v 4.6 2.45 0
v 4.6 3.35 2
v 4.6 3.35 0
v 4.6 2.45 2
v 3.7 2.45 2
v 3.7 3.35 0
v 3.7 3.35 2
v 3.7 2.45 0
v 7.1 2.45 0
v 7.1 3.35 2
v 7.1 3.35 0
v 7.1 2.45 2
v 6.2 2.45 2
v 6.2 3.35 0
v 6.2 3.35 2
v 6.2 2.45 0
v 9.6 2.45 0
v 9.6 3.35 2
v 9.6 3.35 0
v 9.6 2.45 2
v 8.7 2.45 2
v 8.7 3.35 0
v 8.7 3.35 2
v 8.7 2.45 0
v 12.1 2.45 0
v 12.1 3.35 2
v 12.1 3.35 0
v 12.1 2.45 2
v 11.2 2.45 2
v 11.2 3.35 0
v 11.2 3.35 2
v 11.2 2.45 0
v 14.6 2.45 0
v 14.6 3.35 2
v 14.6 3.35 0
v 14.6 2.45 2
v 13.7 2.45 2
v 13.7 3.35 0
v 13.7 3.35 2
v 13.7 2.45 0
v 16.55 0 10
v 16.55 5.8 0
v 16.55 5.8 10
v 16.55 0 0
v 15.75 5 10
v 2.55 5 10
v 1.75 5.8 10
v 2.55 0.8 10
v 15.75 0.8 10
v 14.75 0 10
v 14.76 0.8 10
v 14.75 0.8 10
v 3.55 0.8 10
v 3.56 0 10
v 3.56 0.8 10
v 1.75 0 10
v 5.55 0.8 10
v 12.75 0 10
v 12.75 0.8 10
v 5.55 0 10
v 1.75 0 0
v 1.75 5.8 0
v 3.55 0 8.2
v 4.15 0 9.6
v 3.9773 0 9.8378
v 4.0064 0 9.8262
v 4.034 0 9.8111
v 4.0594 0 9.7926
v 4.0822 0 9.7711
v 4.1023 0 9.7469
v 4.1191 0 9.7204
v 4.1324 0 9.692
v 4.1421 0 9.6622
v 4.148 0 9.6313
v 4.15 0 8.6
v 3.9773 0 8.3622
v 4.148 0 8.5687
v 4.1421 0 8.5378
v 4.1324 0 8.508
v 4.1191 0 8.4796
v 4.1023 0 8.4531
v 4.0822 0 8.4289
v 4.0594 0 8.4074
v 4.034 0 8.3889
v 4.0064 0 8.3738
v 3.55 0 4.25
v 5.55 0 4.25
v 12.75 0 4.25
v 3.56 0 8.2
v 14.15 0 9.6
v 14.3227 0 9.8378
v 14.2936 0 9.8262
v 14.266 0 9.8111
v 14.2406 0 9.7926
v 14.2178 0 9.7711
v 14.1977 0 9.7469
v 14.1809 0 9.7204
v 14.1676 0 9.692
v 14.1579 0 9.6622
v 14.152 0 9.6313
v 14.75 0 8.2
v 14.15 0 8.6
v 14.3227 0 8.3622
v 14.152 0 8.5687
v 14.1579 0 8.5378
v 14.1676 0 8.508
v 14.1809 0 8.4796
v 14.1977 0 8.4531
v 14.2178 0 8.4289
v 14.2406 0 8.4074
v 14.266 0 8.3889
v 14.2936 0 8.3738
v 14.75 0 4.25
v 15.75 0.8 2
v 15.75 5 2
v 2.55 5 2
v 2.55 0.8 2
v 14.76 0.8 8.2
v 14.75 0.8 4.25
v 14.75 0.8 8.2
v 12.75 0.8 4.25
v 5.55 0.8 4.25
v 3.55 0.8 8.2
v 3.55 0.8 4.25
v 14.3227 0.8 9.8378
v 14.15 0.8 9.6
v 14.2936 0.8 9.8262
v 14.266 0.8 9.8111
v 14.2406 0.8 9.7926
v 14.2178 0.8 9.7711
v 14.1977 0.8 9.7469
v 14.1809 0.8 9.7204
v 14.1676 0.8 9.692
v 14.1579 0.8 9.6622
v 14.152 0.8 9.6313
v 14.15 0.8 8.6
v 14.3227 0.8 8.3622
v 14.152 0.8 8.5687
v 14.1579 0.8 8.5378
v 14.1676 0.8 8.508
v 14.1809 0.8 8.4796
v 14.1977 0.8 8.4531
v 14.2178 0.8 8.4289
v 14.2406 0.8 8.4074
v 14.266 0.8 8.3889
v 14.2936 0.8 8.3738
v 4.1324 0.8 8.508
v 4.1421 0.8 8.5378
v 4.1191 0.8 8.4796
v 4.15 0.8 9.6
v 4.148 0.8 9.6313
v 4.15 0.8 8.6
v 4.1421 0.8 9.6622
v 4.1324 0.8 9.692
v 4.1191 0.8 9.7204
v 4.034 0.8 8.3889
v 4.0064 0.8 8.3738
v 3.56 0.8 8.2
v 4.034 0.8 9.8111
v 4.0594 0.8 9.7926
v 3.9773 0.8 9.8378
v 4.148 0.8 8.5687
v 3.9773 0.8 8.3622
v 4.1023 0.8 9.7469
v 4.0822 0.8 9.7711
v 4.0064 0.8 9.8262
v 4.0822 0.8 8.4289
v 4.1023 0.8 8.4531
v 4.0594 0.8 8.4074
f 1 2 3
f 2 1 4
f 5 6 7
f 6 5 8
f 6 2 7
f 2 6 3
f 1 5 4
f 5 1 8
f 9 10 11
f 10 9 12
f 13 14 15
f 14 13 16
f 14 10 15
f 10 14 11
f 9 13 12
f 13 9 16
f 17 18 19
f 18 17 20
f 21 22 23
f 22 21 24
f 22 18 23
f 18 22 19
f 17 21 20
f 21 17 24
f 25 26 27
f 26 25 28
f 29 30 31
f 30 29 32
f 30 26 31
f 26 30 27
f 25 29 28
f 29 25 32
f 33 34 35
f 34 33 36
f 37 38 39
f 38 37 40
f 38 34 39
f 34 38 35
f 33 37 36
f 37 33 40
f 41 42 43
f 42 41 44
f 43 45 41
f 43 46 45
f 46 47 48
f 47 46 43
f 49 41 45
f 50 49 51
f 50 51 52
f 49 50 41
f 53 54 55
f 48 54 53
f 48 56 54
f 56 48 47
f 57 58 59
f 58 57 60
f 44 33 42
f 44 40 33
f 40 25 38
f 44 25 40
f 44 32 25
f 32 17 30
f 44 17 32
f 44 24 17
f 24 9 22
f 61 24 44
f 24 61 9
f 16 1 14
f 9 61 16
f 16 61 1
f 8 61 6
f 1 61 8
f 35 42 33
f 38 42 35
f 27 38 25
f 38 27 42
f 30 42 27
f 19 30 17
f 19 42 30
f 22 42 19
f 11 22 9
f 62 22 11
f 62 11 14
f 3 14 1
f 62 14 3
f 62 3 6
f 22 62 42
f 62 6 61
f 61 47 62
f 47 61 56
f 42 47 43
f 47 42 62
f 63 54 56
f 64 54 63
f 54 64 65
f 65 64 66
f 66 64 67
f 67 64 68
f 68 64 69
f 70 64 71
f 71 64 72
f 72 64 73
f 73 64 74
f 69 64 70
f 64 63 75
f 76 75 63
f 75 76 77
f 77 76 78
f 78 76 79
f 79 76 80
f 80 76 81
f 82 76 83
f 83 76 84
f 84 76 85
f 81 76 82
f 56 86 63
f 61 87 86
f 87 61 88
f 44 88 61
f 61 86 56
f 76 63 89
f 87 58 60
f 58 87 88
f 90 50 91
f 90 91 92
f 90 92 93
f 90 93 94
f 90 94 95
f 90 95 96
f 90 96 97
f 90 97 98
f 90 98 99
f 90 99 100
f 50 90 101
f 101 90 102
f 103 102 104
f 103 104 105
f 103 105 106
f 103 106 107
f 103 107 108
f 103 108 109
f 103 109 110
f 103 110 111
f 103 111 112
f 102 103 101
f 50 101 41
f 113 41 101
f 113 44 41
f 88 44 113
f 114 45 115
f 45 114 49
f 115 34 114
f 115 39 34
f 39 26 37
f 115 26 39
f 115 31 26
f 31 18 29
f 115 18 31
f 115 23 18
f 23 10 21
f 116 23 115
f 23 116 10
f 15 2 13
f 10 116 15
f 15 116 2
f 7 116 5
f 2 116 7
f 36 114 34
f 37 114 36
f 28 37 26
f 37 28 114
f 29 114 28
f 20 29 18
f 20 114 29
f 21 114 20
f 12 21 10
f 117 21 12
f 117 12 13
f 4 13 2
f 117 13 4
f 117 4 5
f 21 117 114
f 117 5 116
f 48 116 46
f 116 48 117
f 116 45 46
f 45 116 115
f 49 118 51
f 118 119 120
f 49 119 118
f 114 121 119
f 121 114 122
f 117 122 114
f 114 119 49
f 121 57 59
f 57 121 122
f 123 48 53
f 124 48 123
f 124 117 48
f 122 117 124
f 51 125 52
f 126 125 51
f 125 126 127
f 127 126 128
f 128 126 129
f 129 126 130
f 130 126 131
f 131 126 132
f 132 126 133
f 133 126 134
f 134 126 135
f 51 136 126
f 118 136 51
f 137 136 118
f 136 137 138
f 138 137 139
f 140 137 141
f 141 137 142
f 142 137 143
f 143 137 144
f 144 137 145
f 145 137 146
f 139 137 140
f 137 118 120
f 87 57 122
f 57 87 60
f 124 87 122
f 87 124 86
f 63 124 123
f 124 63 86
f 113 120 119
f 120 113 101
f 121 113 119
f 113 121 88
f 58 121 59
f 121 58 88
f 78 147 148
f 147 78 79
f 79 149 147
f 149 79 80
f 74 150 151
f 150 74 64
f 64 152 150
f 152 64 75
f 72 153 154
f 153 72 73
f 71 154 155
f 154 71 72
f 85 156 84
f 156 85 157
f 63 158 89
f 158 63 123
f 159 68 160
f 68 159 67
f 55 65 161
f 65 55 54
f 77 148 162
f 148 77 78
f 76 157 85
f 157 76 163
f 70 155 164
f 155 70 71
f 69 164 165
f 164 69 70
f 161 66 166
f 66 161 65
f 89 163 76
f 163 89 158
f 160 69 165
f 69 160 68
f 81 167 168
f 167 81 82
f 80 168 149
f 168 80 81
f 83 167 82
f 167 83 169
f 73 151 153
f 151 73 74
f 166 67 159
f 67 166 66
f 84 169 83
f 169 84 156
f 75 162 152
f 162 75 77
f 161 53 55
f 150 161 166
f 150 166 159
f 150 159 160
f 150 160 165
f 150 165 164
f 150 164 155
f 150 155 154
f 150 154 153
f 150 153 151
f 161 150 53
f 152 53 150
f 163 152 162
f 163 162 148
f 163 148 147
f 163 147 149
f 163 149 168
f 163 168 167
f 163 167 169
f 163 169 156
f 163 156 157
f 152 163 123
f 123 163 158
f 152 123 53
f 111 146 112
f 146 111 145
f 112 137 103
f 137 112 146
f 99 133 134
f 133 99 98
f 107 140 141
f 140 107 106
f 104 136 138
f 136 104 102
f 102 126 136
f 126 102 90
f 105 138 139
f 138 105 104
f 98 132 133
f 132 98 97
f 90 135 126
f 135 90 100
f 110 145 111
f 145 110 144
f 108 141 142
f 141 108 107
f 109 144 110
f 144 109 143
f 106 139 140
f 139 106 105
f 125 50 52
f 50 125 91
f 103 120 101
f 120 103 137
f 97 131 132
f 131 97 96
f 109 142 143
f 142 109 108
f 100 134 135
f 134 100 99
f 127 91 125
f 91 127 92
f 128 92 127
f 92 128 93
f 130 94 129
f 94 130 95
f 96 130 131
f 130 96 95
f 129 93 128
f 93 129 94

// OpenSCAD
fudge = 0.01;

//This is the S value, or the cell count of the battery
S = 4;

//This defines the number of pins for the jack.  This number is the S value or cell count of the 
//battery pack plus 1.  So a 3S battery will have 3+1 or 4 pins.
pins = S+1;

connector_wall_thickness = 0.8;
connector_base_thickness = 2;

pin_offset = 2.8;
pin_spacing = 2.5;
pin_width = 0.9;
pin_gap = pin_spacing-pin_width;

plug_width = 4.2;
plug_length = ((pins-1)*pin_spacing)+(pin_gap*2);
plug_height = 8;

connector_width = plug_width+(connector_wall_thickness*2);
connector_length = plug_length+(connector_wall_thickness*2);
connector_height = connector_base_thickness+plug_height;

start_offset_x = 1.75;
clip_edge_offset = 1.8;
clip_z_offset = 2.25;
clip_width = 2;
clip_height = plug_height-clip_z_offset;

difference() {
    //import("/home/dbemowsk/Downloads/balance_plug.STL");
    //translate([10, -fudge/2, -fudge/2]) cube([7, 7, 9]);
}


difference() {
    //Create the outer shell of the jack
    translate([start_offset_x, 0, 0]) cube([connector_length, connector_width, connector_height]);
    //Hollow out the inside of the jack for the connector
    translate([start_offset_x+connector_wall_thickness, connector_wall_thickness, connector_base_thickness]) cube([plug_length, plug_width, plug_height+fudge]);
    //Cut out the two alignment slots
    translate([start_offset_x+clip_edge_offset, -fudge/2, connector_base_thickness+clip_z_offset]) cube([clip_width, connector_wall_thickness+fudge, clip_height+fudge]);
    translate([start_offset_x+connector_length-clip_edge_offset-clip_width, -fudge/2, connector_base_thickness+clip_z_offset]) cube([clip_width, connector_wall_thickness+fudge, clip_height+fudge]);
    //Make the holes for the pins
    for(x=[0 : pins-1]) {
        translate([start_offset_x+connector_wall_thickness+pin_gap+(x*pin_spacing), connector_width/2, -fudge/2]) cube([pin_width, pin_width, 15], center=true);
    }
}
//Create the two clip catches
hull() {
    translate([start_offset_x+clip_edge_offset, 0, connector_height-connector_wall_thickness]) cube([fudge, connector_wall_thickness, connector_wall_thickness]);
    translate([start_offset_x+clip_edge_offset+0.35, 0, connector_height-(connector_wall_thickness/2)]) rotate([-90, 0, 0]) cylinder(connector_wall_thickness, d=0.5, $fn=50);
    translate([start_offset_x+clip_edge_offset, 0, connector_height-connector_wall_thickness-1]) cube([fudge, connector_wall_thickness, connector_wall_thickness]);
    translate([start_offset_x+clip_edge_offset+0.35, 0, connector_height-(connector_wall_thickness/2)-1]) rotate([-90, 0, 0]) cylinder(connector_wall_thickness, d=0.5, $fn=50);
}
hull() {
    translate([start_offset_x+connector_length-(clip_edge_offset+0.35), 0, connector_height-(connector_wall_thickness/2)]) rotate([-90, 0, 0]) cylinder(connector_wall_thickness, d=0.5, $fn=50);
    translate([start_offset_x+connector_length-clip_edge_offset, 0, connector_height-connector_wall_thickness]) cube([fudge, connector_wall_thickness, connector_wall_thickness]);
    translate([start_offset_x+connector_length-(clip_edge_offset+0.35), 0, connector_height-(connector_wall_thickness/2)-1]) rotate([-90, 0, 0]) cylinder(connector_wall_thickness, d=0.5, $fn=50);
    translate([start_offset_x+connector_length-clip_edge_offset, 0, connector_height-connector_wall_thickness-1]) cube([fudge, connector_wall_thickness, connector_wall_thickness]);
}
